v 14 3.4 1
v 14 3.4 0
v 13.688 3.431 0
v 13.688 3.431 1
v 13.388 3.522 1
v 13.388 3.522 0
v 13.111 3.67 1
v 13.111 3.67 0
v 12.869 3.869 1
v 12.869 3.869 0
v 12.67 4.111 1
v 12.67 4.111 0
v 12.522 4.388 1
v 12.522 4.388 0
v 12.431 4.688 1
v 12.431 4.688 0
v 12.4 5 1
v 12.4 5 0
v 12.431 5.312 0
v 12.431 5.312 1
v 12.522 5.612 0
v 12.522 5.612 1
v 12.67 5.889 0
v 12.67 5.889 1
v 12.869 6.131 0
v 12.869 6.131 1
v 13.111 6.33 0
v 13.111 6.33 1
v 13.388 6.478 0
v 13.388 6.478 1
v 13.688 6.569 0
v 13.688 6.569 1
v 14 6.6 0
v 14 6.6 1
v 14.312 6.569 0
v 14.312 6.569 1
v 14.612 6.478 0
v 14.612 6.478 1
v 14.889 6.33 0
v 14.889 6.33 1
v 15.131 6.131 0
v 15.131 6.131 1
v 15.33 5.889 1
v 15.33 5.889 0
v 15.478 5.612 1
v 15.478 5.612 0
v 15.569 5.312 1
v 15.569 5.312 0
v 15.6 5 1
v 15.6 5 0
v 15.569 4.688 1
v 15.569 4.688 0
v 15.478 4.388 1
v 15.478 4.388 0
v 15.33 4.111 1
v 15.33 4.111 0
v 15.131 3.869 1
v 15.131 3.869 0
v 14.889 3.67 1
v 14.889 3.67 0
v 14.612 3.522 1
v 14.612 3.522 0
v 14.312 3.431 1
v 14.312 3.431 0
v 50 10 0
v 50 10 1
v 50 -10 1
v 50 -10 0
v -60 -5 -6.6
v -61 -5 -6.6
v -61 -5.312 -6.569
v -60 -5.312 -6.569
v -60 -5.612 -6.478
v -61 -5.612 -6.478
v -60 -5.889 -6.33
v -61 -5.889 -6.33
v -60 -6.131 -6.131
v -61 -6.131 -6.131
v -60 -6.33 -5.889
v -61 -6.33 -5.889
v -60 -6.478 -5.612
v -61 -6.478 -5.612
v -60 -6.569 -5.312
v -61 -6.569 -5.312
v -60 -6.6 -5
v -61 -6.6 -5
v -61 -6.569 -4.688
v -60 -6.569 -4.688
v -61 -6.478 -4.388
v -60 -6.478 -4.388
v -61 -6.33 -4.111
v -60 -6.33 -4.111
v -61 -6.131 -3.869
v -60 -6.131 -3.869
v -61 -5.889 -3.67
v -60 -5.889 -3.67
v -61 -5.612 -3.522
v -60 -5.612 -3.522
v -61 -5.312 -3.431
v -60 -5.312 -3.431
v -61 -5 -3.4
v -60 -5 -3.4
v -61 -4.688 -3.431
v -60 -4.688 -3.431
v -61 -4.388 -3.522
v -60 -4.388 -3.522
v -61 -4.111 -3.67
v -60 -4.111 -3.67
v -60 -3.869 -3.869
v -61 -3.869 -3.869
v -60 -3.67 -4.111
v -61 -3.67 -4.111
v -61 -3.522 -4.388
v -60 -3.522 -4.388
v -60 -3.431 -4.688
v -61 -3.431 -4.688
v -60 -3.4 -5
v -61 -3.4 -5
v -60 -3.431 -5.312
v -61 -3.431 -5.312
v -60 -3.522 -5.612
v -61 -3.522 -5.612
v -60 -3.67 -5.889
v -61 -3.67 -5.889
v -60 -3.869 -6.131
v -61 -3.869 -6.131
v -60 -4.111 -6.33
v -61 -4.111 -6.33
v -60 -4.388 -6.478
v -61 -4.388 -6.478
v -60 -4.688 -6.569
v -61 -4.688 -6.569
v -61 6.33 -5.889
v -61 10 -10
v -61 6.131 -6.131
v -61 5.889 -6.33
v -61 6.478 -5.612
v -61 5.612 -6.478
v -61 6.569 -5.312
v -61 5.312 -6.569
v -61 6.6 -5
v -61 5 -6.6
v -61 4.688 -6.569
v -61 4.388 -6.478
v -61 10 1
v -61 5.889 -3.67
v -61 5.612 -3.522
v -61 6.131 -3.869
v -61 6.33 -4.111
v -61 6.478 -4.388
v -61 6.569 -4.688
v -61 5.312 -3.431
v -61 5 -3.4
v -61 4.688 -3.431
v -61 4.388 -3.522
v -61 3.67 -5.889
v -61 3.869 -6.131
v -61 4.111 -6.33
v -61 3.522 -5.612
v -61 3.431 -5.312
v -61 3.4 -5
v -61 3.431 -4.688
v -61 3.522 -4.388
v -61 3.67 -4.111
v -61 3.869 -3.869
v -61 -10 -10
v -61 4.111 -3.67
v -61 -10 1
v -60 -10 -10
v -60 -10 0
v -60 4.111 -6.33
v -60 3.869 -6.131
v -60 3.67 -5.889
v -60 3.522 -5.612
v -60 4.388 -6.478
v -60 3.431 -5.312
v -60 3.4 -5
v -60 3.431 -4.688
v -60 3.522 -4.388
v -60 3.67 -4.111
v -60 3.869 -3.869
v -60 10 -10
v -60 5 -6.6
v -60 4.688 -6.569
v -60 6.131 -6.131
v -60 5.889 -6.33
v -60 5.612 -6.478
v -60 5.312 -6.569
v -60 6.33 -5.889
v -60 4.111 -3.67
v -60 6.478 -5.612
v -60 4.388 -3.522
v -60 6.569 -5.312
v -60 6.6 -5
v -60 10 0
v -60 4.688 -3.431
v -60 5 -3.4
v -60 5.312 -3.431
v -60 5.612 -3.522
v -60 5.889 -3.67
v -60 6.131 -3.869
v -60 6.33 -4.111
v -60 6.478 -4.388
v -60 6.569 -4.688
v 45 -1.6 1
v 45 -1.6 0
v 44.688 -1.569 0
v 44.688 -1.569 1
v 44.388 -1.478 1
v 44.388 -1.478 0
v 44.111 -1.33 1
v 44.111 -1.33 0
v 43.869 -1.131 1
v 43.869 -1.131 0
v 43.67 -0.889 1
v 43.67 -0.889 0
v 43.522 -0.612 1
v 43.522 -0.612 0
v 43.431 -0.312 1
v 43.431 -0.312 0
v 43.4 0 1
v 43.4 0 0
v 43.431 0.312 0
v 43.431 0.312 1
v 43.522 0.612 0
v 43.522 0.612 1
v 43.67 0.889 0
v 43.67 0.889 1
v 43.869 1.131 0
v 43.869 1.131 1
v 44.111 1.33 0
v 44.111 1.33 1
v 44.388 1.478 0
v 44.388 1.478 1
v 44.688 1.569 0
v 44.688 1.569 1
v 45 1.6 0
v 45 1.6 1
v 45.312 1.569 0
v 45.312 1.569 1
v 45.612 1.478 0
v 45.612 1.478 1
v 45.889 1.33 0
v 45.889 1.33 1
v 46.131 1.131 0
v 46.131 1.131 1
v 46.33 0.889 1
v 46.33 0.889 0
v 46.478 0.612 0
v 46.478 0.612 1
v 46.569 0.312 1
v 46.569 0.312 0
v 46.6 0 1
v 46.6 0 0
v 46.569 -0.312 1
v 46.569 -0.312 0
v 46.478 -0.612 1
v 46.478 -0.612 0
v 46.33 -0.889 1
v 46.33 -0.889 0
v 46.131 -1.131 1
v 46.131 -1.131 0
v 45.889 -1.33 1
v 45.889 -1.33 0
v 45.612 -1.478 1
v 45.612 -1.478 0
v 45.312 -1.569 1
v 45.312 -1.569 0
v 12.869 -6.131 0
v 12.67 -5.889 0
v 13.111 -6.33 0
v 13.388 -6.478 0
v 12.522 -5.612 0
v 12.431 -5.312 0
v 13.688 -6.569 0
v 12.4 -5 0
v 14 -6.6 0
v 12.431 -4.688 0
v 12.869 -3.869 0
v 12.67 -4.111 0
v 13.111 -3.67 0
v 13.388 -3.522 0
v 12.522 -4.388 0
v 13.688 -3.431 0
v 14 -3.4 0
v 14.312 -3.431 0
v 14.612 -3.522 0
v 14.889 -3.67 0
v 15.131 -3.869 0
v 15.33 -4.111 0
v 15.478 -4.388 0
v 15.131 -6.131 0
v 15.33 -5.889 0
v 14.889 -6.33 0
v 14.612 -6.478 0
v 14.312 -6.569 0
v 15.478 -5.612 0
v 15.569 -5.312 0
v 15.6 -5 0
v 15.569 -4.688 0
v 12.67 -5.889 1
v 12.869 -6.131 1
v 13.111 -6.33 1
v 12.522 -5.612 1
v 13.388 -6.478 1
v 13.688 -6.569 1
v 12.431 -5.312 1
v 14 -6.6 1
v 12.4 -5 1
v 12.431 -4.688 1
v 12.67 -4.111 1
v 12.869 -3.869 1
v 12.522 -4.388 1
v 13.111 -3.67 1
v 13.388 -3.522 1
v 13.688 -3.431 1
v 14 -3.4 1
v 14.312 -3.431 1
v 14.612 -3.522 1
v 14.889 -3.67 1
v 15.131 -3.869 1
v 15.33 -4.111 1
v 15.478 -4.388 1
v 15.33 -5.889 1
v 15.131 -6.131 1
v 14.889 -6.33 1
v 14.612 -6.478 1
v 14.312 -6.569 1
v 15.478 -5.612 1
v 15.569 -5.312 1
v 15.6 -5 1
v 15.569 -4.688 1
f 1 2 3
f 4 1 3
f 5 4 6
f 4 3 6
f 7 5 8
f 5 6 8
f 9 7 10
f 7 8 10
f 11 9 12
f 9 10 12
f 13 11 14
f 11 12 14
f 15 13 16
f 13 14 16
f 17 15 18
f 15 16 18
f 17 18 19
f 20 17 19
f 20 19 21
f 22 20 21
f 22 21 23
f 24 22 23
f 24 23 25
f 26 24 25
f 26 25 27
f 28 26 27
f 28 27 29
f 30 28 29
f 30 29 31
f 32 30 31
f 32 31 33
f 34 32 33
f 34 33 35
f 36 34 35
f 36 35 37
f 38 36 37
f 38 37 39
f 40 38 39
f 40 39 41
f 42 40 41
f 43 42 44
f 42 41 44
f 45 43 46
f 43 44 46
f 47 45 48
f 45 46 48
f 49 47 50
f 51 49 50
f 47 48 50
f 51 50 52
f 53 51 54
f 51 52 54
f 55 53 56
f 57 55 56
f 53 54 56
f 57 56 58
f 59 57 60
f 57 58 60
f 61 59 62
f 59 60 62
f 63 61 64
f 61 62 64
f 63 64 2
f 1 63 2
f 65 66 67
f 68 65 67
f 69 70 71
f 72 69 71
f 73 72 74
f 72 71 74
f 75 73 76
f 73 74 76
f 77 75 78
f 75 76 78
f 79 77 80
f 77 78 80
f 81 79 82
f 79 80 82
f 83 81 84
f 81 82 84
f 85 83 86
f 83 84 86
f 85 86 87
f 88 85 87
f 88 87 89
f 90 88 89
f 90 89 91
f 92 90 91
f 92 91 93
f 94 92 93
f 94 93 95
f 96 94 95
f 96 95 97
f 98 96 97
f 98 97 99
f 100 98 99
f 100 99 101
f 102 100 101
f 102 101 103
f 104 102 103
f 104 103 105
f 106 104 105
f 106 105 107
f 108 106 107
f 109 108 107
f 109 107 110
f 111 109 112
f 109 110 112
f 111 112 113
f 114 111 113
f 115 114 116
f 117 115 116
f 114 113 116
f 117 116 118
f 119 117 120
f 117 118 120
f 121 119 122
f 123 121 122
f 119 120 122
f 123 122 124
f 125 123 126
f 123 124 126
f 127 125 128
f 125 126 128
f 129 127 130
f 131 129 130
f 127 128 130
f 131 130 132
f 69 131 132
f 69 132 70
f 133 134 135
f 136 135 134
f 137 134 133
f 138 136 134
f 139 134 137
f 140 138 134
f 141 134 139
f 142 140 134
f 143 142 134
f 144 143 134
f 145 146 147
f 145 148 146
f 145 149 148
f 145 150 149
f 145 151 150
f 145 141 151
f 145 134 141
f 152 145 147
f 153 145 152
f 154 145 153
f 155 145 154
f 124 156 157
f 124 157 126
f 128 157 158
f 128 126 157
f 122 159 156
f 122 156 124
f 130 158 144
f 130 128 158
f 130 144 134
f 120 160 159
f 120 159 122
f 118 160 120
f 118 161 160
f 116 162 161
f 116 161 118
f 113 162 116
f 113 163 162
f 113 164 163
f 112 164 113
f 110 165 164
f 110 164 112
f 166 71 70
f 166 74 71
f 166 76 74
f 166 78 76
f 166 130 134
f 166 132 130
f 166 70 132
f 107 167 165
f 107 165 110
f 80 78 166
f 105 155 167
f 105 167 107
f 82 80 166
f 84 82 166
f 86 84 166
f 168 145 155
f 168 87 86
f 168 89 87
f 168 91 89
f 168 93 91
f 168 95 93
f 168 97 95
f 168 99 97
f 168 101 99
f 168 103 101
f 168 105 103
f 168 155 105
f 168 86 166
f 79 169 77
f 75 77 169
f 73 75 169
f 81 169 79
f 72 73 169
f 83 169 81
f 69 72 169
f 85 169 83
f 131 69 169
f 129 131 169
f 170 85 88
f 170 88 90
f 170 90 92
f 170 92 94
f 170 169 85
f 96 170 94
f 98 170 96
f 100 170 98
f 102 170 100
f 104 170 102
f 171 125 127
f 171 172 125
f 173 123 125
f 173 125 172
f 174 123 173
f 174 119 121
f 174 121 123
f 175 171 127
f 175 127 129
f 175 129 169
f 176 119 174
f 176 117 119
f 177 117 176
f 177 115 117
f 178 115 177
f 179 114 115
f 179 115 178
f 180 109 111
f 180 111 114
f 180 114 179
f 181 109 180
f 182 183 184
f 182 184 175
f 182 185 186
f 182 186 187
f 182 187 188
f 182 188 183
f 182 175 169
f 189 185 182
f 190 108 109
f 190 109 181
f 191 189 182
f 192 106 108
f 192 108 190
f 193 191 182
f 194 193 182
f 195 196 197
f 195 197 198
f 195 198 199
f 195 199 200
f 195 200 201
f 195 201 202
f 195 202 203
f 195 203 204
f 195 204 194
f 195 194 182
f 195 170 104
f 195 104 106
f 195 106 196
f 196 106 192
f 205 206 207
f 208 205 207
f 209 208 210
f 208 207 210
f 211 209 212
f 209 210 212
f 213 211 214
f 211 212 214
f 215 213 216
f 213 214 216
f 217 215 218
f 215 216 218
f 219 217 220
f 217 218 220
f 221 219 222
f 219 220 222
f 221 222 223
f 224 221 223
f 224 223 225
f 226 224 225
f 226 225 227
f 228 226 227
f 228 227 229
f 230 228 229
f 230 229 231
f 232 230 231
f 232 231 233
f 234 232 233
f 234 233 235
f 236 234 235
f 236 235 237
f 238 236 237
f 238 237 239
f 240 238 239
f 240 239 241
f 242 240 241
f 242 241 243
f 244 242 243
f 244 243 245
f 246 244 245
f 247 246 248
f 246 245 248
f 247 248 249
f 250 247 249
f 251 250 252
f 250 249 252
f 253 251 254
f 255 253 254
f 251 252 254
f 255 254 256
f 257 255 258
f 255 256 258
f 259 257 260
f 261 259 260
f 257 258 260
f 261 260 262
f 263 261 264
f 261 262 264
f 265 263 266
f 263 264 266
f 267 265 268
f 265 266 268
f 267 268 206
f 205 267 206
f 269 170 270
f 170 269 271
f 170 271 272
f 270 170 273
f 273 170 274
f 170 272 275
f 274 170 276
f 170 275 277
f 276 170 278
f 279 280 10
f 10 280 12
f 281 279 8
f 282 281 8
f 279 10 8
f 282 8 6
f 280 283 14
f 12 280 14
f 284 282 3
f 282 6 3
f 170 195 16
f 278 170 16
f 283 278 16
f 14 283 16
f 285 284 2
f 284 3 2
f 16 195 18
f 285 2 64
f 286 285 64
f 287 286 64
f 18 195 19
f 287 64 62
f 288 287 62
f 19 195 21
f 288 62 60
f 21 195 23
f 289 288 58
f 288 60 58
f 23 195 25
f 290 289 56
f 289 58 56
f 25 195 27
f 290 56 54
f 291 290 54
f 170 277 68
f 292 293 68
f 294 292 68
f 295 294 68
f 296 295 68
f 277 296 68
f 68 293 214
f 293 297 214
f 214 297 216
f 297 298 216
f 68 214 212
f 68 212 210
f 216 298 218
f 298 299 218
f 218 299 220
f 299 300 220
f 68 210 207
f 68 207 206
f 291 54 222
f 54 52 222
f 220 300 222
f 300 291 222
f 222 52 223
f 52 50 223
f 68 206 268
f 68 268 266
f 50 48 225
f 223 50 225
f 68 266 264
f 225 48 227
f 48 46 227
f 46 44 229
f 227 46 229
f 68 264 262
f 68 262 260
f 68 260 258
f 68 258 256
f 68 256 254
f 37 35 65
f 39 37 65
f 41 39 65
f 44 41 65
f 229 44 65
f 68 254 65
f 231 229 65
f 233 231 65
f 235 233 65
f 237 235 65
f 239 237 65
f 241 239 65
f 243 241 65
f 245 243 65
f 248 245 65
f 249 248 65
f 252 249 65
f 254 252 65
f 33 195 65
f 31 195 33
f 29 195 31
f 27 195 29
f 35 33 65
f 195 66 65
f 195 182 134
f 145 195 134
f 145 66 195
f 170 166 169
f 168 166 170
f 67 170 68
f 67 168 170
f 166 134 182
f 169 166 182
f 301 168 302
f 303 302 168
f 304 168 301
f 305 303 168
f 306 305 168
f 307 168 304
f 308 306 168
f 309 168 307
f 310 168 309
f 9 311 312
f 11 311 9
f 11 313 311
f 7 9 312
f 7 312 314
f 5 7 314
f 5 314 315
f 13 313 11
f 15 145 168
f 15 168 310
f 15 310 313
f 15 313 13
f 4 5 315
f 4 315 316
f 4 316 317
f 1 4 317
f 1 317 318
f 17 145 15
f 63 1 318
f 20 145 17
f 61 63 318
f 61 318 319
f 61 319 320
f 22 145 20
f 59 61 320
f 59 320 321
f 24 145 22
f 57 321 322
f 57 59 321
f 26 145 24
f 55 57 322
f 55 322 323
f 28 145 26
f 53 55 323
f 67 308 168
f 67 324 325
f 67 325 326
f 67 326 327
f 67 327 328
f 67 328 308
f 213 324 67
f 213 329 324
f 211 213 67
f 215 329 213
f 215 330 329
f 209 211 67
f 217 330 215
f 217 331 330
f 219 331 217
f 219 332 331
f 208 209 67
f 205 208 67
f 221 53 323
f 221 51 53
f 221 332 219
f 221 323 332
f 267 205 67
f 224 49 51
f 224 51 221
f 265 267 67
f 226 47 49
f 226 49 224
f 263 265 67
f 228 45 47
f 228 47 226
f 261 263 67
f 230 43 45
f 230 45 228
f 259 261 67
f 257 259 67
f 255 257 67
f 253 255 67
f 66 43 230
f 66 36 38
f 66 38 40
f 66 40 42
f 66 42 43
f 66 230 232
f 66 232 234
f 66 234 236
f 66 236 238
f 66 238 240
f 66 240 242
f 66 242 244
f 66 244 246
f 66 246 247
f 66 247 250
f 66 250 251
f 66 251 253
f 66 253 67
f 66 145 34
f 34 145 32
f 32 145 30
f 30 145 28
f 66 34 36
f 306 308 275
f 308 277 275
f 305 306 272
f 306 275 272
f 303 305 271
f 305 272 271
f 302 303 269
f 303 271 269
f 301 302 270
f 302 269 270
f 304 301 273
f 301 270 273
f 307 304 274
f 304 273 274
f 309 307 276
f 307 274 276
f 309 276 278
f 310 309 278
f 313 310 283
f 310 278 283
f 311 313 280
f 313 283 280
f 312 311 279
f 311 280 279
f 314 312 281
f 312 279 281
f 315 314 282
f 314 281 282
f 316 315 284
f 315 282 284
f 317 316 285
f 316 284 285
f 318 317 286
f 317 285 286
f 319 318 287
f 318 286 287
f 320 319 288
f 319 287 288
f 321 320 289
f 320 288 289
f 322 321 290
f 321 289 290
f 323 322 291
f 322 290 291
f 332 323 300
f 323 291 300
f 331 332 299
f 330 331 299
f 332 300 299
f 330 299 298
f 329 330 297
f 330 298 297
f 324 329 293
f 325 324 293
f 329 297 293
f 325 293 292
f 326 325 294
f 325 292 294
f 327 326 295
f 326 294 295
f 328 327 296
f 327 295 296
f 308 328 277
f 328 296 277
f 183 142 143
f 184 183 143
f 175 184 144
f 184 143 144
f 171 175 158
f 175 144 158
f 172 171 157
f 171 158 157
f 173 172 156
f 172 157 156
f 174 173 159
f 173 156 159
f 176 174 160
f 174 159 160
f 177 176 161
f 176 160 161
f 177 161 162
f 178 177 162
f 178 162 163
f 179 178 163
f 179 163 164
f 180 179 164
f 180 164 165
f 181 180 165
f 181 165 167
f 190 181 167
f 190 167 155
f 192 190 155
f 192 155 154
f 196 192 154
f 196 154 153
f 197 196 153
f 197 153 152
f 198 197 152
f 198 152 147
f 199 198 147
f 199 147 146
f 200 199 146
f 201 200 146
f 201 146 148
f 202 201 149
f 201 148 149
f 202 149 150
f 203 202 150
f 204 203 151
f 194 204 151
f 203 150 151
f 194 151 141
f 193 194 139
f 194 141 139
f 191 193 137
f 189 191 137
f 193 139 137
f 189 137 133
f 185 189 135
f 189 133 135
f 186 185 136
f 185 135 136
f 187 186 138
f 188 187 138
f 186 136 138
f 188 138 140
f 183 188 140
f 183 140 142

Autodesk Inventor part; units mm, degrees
ref_plane "YZ Plane" through (0, 0, 0) normal (1, 0, 0) x (0, 1, 0)
ref_plane "XZ Plane" through (0, 0, 0) normal (0, 1, 0) x (-1, 0, 0)
ref_plane "XY Plane" through (0, 0, 0) normal (0, 0, 1) x (1, 0, 0)
sketch "スケッチ1" plane through (0, 0, 0) normal (0, 0, 1) x (1, 0, 0)
  line L0 (-60, 10) -> (60, 10)
  line L1 (60, 10) -> (60, -10)
  line L2 (60, -10) -> (-60, -10)
  line L3 (-60, -10) -> (-60, 10)
  line L4 (-60, 10) -> (60, -10) construction
  line L5 (60, 10) -> (-60, -10) construction
  point P0 (0, 0)
  dimension "d0" = 120
  dimension "d1" = 20
extrude "押し出し1" add sketch "スケッチ1" along normal blind 1
sketch "スケッチ2" plane through (0, 0, 1) normal (0, 0, 1) x (1, 0, 0)
  line L0 (60, -10) -> (60, 10) projected
  line L1 (60, 10) -> (-60, 10) projected
  line L2 (-60, 10) -> (-60, -10) projected
  line L3 (-60, -10) -> (60, -10) projected
  point P0 (0, 0)
  point P1 (14, 5)
  point P2 (14, -5)
  point P3 (45, 0)
  dimension "d4" = 15
  dimension "d5" = 10
  dimension "d7" = 46
  dimension "d8" = 5
  dimension "d9" = 5
hole "穴1" at (14, 5, 1) at (14, -5, 1) at (45, 0, 1) direction (0, 0, -1) diameter 3.2 end through all
sketch "スケッチ3" plane through (0, 0, 1) normal (0, 0, 1) x (1, 0, 0)
  line L0 (-60, 10) -> (-61, 10)
  line L1 (-61, 10) -> (-61, -10)
  line L2 (-61, -10) -> (-60, -10)
  line L3 (-60, -10) -> (-60, 10)
  point P0 (0, 0)
  dimension "d17" = 1
  dimension "d18" = 20
extrude "押し出し2" add sketch "スケッチ3" against normal blind 11
sketch "スケッチ4" plane through (-60, -10, 0) normal (1, 0, 0) x (0, 0, -1)
  line L0 (10, 20) -> (10, 0) projected
  line L1 (0, 20) -> (10, 20) projected
  line L2 (0, 0) -> (10, 0) projected
  point P0 (0, 10)
  point P1 (5, 15)
  point P2 (5, 5)
  dimension "d21" = 5
  dimension "d22" = 5
  dimension "d30" = 5
  dimension "d31" = 5
  dimension "d32" = 10
hole "穴2" at (-60, 5, -5) at (-60, -5, -5) direction (-1, 0, 0) diameter 3.2 end through all
sketch "スケッチ5" plane through (0, 0, 1) normal (0, 0, 1) x (1, 0, 0)
  line L0 (-61, -10) -> (60, -10) projected
  line L1 (60, 10) -> (50, 10)
  line L2 (50, 10) -> (50, -10)
  line L3 (50, -10) -> (60, -10)
  line L4 (60, -10) -> (60, 10)
  point P0 (0, 0)
  dimension "d33" = 10
extrude "押し出し3" cut sketch "スケッチ5" against normal blind 10
properties part number "爪＿2" material "アルミニウム 6061"
